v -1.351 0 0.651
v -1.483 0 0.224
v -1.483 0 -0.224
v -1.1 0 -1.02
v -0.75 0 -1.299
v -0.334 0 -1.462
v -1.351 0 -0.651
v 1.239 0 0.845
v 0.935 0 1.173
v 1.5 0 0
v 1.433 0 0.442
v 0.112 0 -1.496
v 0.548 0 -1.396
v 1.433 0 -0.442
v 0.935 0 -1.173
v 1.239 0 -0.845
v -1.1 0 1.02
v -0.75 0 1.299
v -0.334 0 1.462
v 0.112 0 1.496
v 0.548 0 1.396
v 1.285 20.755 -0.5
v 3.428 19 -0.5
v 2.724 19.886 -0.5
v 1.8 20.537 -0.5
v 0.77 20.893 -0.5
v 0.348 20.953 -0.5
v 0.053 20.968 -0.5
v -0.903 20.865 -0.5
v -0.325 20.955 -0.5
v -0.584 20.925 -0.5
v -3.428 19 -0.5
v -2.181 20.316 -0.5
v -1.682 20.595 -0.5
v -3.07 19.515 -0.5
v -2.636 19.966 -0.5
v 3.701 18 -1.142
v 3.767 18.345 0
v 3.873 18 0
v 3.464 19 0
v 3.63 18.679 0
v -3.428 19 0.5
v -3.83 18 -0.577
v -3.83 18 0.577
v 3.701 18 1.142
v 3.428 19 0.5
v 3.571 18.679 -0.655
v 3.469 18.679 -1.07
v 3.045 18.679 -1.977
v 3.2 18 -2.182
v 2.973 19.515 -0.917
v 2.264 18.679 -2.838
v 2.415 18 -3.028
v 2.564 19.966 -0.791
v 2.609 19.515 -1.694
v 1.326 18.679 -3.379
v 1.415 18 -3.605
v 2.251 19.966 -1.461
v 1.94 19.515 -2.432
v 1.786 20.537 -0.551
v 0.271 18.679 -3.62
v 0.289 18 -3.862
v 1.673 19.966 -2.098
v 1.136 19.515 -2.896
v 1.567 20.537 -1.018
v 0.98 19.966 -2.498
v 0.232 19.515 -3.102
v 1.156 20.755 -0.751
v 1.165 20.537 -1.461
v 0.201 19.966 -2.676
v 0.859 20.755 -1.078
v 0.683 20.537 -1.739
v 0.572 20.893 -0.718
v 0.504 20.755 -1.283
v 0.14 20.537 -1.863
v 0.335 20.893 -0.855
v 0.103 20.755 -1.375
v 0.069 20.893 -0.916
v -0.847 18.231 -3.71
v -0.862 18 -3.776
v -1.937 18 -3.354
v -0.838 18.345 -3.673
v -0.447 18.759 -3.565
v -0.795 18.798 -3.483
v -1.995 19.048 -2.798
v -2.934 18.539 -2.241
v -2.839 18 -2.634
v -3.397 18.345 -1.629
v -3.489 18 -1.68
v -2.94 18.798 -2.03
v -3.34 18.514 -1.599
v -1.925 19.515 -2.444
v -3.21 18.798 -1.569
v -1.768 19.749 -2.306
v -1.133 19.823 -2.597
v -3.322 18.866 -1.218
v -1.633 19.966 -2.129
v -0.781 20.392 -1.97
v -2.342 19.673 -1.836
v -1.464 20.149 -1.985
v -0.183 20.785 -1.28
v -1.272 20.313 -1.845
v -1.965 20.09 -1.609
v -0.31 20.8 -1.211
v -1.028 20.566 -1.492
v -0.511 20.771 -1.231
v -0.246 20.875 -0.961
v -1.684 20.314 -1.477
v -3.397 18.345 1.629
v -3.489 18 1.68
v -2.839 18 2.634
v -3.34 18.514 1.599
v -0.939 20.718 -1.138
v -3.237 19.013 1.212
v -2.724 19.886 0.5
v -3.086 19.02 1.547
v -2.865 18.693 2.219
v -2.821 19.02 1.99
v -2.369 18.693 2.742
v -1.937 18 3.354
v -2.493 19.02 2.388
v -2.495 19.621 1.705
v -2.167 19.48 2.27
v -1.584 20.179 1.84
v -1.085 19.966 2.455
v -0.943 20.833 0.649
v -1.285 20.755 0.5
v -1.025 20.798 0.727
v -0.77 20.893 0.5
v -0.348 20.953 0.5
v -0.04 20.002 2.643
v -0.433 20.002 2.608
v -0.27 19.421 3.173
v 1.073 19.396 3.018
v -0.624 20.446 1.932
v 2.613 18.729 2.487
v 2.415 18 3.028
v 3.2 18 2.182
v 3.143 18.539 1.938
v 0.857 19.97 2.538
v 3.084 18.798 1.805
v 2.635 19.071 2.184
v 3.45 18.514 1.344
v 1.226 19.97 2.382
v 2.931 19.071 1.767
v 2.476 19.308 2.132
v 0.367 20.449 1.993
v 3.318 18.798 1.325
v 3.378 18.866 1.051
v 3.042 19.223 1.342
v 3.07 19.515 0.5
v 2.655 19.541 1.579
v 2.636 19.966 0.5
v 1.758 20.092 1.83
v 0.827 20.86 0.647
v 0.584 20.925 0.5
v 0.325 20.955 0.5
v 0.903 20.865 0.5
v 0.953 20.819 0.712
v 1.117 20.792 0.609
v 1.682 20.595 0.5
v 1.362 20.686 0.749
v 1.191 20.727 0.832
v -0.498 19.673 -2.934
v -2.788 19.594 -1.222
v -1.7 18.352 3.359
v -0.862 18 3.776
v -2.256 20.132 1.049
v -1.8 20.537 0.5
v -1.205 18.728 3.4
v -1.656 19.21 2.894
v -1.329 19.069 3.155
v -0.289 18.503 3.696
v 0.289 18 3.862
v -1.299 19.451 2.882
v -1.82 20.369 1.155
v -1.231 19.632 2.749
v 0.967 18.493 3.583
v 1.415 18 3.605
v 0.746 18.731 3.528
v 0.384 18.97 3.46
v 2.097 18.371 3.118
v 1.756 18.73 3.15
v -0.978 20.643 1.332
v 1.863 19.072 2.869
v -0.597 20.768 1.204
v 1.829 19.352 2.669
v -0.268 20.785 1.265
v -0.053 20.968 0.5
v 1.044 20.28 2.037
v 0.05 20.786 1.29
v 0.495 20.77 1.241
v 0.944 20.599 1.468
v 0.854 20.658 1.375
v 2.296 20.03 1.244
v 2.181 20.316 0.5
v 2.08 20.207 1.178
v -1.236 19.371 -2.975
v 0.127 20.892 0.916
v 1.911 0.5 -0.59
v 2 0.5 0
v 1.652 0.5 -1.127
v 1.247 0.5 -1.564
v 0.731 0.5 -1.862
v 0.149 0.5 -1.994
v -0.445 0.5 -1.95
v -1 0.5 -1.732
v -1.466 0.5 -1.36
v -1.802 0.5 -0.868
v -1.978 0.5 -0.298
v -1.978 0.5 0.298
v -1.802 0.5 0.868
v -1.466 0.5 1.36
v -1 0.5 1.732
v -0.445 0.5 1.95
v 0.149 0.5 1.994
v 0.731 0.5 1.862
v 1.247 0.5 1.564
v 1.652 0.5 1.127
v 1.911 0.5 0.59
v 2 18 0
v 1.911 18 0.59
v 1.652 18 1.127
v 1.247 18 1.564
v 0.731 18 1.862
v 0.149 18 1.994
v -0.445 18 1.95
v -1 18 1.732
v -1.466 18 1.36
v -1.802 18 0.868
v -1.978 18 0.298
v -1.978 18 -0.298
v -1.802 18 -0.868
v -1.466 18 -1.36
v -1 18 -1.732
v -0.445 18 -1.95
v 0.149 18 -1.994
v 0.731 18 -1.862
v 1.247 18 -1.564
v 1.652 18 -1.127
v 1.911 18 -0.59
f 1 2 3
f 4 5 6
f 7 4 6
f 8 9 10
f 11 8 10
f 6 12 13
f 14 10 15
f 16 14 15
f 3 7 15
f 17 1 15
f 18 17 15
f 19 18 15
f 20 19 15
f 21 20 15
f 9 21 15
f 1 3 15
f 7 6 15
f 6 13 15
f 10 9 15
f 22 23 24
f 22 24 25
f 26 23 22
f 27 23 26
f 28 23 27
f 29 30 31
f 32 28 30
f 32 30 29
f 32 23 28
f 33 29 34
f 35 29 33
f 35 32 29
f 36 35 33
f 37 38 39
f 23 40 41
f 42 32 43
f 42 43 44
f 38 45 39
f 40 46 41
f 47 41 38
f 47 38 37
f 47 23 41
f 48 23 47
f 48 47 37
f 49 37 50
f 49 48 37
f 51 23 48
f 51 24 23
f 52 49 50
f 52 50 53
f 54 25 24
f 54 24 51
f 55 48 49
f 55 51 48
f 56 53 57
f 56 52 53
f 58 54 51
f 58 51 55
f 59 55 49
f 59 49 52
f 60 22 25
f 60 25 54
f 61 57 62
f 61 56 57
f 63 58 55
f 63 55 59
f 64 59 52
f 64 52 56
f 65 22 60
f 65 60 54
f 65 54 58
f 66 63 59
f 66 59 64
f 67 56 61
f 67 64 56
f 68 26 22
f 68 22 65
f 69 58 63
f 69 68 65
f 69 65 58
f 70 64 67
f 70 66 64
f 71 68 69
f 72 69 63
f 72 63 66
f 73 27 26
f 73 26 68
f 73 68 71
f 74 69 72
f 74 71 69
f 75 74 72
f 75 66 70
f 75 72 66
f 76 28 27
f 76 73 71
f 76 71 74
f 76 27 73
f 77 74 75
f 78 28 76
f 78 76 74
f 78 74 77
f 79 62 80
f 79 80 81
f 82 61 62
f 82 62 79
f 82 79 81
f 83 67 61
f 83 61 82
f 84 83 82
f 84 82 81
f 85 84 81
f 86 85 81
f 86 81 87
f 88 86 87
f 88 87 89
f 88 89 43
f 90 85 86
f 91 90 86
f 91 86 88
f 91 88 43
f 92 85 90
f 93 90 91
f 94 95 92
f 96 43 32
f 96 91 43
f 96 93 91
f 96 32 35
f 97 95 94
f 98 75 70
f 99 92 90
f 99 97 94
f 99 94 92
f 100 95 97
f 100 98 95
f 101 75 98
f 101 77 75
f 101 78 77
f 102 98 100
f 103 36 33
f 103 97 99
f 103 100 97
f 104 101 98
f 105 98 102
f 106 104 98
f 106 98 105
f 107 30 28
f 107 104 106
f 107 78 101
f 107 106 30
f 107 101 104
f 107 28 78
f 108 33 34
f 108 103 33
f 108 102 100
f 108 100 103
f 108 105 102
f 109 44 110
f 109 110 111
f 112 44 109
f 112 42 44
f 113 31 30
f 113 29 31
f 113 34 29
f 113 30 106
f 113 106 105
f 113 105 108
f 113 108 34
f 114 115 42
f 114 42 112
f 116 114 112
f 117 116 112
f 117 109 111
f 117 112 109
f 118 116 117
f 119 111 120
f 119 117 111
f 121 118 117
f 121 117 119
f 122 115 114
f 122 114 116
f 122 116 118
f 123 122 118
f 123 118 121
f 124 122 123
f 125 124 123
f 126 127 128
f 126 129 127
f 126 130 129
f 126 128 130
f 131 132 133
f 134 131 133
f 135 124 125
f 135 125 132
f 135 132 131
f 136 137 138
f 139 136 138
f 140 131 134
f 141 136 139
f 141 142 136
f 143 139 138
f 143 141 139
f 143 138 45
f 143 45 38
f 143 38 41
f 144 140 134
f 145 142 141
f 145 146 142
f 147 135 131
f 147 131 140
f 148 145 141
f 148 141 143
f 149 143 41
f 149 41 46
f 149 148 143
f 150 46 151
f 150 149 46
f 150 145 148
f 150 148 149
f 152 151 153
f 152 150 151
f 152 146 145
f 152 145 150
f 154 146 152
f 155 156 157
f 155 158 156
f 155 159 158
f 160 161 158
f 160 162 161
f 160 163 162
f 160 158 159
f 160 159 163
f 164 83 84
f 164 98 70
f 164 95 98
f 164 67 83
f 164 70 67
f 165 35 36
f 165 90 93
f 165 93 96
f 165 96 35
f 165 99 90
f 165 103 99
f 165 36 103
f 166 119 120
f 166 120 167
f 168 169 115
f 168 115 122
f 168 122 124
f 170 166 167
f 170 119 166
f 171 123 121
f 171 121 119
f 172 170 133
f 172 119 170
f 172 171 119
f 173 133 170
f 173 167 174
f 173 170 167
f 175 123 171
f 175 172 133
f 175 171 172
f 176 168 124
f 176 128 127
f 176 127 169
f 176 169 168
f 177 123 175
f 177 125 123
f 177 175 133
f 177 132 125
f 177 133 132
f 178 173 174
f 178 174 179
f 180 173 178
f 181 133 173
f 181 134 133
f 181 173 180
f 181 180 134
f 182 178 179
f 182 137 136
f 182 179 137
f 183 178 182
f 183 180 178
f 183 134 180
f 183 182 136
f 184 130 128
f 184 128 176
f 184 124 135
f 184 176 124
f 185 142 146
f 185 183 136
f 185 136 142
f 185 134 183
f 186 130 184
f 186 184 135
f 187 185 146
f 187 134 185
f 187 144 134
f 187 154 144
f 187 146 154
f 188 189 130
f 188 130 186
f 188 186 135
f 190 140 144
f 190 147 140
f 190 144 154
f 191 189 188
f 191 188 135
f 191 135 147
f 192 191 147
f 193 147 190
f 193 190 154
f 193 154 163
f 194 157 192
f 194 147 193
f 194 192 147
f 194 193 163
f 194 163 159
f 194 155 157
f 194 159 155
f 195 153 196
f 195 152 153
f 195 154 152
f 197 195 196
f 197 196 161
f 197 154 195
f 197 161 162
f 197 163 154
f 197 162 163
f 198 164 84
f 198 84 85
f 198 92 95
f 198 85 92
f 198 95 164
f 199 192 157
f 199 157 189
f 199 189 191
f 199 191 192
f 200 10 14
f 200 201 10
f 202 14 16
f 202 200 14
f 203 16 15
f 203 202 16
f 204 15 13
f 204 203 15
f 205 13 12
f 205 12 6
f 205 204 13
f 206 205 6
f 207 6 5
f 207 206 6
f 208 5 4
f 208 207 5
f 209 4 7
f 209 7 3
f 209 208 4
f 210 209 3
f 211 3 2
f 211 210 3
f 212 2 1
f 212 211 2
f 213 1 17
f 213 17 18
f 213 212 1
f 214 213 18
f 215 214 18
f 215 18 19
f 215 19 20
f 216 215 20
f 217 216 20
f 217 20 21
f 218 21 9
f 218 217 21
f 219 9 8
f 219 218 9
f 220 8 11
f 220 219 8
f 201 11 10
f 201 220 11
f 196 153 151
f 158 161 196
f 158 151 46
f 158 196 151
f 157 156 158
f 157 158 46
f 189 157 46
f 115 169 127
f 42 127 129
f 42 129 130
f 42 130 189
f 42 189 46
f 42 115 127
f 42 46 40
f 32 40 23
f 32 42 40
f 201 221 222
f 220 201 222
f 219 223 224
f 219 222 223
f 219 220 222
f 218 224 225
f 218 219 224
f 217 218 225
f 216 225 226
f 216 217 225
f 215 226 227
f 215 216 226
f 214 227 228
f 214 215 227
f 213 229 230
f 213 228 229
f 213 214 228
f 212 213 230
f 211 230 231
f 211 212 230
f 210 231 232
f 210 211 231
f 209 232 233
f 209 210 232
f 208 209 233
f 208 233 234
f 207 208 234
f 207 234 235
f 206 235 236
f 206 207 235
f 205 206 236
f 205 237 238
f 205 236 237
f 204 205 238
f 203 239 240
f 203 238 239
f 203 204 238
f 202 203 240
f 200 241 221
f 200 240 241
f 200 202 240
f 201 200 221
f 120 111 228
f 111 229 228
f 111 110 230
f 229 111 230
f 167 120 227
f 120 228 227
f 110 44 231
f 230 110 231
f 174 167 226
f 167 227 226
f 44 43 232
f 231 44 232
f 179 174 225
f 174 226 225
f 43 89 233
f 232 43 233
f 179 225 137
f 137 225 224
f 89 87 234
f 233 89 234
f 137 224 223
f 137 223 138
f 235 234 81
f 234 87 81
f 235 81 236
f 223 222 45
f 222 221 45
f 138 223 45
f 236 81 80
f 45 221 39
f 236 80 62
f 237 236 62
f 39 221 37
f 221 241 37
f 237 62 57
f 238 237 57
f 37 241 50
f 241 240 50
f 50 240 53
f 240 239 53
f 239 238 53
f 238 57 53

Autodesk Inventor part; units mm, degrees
ref_plane "YZ Plane" through (0, 0, 0) normal (1, 0, 0) x (0, 1, 0)
ref_plane "XZ Plane" through (0, 0, 0) normal (0, 1, 0) x (-1, 0, 0)
ref_plane "XY Plane" through (0, 0, 0) normal (0, 0, 1) x (1, 0, 0)
sketch "Sketch1" plane through (0, 0, 0) normal (0, 0, 1) x (1, 0, 0)
  line L0 (0, 0) -> (0, 21)
  arc A0 (3.873, 18) -> (0, 21) centre (0, 17) ccw
  line L1 (3.873, 18) -> (2, 18)
  line L2 (2, 18) -> (2, 0)
  line L3 (2, 0) -> (0, 0)
  dimension "Diameter" = 4
  dimension "Length" = 18
  dimension "d2" = 4
  dimension "d3" = 3
revolve "Revolution1" add sketch "Sketch1" angle 360 about axis through (0, 0, 0) along (0, 1, 0)
thread "Thread1" size "M4x0.7" class "6g" standard "ANSI Metric M Profile" length 10
sketch "Sketch2" plane through (0, 0, 0) normal (1, 0, 0) x (0, 1, 0)
  arc A0 (18, -3.873) -> (18, 3.873) centre (17, 0) ccw construction
  line L0 (0, 0) -> (21, 0) construction
  line L1 (21, 0.5) -> (19, 0.5)
  line L2 (19, 0.5) -> (19, -0.5)
  line L3 (19, -0.5) -> (21, -0.5)
  line L4 (21, -0.5) -> (21, 0.5)
  dimension "d7" = 2
  dimension "d8" = 1
extrude "Extrusion1" cut sketch "Sketch2" along normal through all both and the other way through all
chamfer "Chamfer1" distance 0.5 angle 45 1 edges at (-2, 0, 0)
equation "\"d2\" = Diameter"
equation "\"d3\" = 0.75 * Diameter"
equation "\"d7\" = 0.5 * Diameter"
equation "\"d8\" = 0.25 * Diameter"
properties part number "Round Head Machine Screw"
